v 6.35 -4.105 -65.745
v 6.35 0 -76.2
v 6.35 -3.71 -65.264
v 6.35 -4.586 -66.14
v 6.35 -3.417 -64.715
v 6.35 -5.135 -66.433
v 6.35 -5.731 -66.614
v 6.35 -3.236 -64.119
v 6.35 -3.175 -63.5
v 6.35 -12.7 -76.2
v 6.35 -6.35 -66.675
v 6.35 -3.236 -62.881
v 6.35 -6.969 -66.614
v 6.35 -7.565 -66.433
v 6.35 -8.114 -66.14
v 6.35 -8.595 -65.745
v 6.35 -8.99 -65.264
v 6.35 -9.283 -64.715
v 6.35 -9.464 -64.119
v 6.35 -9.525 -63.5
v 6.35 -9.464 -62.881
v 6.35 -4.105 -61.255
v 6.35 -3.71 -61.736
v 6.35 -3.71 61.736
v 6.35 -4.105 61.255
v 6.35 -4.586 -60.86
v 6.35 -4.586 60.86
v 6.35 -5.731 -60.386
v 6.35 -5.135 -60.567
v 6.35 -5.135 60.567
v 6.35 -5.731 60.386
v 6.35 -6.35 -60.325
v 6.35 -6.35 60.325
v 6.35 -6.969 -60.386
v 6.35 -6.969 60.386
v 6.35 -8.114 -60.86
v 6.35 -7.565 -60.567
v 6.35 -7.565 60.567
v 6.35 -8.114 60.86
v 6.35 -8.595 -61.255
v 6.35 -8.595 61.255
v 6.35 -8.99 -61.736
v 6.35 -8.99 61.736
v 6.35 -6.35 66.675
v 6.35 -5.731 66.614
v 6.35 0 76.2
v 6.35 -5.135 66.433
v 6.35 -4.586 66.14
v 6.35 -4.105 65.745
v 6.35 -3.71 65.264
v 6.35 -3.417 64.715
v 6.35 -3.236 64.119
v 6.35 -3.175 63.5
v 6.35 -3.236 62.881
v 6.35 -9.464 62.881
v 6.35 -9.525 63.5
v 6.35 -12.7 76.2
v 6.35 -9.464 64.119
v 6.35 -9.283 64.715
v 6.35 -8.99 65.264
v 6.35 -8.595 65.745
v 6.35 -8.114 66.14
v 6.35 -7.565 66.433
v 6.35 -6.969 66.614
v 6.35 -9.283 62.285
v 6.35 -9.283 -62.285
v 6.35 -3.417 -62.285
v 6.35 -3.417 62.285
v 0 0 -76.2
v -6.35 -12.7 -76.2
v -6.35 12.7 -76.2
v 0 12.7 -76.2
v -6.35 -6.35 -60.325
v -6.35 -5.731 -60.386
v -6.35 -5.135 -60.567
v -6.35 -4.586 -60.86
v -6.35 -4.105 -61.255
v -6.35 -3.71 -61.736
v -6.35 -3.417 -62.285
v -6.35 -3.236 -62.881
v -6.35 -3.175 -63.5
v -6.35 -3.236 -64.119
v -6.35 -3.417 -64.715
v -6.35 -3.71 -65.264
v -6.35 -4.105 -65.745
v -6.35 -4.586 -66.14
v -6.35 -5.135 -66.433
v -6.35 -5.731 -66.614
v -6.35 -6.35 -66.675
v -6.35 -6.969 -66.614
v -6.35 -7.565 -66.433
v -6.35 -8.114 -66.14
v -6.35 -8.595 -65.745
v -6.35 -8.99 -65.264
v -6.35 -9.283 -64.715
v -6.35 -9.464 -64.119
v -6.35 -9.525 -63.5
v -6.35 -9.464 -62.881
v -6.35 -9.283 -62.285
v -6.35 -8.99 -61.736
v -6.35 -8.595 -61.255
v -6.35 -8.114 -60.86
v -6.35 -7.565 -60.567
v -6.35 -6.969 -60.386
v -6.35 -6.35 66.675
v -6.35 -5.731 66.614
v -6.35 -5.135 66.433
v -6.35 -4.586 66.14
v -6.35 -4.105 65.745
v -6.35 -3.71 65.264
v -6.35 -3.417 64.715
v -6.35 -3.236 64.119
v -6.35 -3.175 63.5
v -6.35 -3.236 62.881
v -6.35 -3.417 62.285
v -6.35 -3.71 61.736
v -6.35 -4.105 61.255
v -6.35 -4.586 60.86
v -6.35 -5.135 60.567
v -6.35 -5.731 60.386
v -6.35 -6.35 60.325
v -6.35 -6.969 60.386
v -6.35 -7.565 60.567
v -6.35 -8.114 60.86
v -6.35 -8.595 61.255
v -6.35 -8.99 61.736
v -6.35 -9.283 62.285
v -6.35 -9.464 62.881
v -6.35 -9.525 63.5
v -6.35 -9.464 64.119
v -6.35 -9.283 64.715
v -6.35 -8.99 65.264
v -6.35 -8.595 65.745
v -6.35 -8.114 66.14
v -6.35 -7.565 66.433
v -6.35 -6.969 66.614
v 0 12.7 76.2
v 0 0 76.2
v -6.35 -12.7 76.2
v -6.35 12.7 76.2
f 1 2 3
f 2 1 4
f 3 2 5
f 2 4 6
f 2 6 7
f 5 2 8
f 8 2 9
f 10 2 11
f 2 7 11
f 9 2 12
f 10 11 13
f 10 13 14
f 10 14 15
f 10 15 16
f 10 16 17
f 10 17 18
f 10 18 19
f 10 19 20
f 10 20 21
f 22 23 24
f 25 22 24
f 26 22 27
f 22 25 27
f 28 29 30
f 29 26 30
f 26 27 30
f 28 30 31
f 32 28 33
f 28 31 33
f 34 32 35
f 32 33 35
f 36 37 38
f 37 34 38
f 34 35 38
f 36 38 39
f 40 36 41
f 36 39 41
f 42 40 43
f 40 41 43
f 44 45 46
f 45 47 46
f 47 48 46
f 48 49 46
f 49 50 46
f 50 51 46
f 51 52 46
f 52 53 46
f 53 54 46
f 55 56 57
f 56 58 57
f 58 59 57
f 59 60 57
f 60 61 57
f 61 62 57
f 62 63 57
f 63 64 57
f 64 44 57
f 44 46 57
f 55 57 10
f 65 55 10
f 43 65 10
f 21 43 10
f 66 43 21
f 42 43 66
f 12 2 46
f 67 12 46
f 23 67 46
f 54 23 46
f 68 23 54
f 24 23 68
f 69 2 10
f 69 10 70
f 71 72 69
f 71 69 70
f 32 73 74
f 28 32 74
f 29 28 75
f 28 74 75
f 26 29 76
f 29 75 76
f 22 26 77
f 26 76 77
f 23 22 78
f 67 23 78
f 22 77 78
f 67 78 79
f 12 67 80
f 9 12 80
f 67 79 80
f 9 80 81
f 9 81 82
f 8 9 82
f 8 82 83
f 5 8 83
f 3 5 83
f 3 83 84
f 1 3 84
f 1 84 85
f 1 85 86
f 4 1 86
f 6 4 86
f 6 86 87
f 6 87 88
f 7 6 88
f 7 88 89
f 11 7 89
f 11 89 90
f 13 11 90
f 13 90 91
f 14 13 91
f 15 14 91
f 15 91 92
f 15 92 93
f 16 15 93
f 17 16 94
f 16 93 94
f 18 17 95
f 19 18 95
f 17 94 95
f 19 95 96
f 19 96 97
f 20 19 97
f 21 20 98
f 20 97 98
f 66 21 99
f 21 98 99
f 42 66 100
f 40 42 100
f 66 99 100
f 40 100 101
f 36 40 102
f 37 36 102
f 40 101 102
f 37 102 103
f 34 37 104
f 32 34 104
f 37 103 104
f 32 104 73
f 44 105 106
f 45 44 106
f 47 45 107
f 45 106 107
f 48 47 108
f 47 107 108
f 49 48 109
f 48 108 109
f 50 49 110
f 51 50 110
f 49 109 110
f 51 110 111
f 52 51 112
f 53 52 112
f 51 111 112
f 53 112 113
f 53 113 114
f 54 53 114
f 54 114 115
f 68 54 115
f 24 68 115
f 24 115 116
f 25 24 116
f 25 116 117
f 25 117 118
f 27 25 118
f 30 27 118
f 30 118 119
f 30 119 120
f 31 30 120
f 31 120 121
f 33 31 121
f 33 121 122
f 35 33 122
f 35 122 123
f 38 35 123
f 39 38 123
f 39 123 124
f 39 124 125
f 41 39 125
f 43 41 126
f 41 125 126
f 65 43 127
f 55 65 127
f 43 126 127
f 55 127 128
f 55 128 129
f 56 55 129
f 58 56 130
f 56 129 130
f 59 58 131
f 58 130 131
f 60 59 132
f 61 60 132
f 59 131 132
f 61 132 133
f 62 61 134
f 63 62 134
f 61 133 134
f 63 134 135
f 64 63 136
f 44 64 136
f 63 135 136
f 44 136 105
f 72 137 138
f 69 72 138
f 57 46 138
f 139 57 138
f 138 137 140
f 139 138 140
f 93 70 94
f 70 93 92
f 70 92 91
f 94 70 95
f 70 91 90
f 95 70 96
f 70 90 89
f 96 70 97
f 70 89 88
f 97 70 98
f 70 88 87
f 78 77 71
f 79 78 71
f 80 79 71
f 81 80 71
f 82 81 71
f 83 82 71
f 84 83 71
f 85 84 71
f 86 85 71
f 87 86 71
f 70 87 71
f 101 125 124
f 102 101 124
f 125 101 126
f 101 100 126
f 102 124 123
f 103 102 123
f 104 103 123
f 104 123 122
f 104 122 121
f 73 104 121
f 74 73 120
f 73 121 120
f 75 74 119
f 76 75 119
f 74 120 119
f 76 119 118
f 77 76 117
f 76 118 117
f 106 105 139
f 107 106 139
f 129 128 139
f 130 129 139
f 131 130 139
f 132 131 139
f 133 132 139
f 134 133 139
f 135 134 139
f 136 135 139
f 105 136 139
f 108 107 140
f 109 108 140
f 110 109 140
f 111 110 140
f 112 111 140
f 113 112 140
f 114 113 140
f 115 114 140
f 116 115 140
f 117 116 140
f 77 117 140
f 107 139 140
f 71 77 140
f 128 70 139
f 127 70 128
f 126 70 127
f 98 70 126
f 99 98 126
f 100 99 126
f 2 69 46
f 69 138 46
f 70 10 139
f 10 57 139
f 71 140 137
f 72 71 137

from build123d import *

# Parameters (mm, degrees)
BOSS_EXTRUDE1_DEPTH     = 76.2
SKETCH2_R               = 3.175
CUT_EXTRUDE1_DEPTH      = 1
CUT_EXTRUDE1_DEPTH_BACK = 13.7


with BuildPart() as part:
    # Sketch1 → Boss-Extrude1 (new body, symmetric)
    with BuildSketch(Plane.XY):
        Polygon((0, 12.7), (0, 0), (6.35, 0), (6.35, -12.7), (-6.35, -12.7), (-6.35, 12.7), align=None)
    extrude(amount=BOSS_EXTRUDE1_DEPTH, both=True)

    # Sketch2 → Cut-Extrude1 (cut, two sides)
    with BuildSketch(Plane.ZY.offset(6.35)) as cut_extrude1_sk:
        with Locations((-63.5, -6.35)):
            Circle(SKETCH2_R)
        with Locations((63.5, -6.35)):
            Circle(SKETCH2_R)
    extrude(amount=CUT_EXTRUDE1_DEPTH, mode=Mode.SUBTRACT)
    extrude(cut_extrude1_sk.sketch, amount=-CUT_EXTRUDE1_DEPTH_BACK, mode=Mode.SUBTRACT)


solid = part.part
